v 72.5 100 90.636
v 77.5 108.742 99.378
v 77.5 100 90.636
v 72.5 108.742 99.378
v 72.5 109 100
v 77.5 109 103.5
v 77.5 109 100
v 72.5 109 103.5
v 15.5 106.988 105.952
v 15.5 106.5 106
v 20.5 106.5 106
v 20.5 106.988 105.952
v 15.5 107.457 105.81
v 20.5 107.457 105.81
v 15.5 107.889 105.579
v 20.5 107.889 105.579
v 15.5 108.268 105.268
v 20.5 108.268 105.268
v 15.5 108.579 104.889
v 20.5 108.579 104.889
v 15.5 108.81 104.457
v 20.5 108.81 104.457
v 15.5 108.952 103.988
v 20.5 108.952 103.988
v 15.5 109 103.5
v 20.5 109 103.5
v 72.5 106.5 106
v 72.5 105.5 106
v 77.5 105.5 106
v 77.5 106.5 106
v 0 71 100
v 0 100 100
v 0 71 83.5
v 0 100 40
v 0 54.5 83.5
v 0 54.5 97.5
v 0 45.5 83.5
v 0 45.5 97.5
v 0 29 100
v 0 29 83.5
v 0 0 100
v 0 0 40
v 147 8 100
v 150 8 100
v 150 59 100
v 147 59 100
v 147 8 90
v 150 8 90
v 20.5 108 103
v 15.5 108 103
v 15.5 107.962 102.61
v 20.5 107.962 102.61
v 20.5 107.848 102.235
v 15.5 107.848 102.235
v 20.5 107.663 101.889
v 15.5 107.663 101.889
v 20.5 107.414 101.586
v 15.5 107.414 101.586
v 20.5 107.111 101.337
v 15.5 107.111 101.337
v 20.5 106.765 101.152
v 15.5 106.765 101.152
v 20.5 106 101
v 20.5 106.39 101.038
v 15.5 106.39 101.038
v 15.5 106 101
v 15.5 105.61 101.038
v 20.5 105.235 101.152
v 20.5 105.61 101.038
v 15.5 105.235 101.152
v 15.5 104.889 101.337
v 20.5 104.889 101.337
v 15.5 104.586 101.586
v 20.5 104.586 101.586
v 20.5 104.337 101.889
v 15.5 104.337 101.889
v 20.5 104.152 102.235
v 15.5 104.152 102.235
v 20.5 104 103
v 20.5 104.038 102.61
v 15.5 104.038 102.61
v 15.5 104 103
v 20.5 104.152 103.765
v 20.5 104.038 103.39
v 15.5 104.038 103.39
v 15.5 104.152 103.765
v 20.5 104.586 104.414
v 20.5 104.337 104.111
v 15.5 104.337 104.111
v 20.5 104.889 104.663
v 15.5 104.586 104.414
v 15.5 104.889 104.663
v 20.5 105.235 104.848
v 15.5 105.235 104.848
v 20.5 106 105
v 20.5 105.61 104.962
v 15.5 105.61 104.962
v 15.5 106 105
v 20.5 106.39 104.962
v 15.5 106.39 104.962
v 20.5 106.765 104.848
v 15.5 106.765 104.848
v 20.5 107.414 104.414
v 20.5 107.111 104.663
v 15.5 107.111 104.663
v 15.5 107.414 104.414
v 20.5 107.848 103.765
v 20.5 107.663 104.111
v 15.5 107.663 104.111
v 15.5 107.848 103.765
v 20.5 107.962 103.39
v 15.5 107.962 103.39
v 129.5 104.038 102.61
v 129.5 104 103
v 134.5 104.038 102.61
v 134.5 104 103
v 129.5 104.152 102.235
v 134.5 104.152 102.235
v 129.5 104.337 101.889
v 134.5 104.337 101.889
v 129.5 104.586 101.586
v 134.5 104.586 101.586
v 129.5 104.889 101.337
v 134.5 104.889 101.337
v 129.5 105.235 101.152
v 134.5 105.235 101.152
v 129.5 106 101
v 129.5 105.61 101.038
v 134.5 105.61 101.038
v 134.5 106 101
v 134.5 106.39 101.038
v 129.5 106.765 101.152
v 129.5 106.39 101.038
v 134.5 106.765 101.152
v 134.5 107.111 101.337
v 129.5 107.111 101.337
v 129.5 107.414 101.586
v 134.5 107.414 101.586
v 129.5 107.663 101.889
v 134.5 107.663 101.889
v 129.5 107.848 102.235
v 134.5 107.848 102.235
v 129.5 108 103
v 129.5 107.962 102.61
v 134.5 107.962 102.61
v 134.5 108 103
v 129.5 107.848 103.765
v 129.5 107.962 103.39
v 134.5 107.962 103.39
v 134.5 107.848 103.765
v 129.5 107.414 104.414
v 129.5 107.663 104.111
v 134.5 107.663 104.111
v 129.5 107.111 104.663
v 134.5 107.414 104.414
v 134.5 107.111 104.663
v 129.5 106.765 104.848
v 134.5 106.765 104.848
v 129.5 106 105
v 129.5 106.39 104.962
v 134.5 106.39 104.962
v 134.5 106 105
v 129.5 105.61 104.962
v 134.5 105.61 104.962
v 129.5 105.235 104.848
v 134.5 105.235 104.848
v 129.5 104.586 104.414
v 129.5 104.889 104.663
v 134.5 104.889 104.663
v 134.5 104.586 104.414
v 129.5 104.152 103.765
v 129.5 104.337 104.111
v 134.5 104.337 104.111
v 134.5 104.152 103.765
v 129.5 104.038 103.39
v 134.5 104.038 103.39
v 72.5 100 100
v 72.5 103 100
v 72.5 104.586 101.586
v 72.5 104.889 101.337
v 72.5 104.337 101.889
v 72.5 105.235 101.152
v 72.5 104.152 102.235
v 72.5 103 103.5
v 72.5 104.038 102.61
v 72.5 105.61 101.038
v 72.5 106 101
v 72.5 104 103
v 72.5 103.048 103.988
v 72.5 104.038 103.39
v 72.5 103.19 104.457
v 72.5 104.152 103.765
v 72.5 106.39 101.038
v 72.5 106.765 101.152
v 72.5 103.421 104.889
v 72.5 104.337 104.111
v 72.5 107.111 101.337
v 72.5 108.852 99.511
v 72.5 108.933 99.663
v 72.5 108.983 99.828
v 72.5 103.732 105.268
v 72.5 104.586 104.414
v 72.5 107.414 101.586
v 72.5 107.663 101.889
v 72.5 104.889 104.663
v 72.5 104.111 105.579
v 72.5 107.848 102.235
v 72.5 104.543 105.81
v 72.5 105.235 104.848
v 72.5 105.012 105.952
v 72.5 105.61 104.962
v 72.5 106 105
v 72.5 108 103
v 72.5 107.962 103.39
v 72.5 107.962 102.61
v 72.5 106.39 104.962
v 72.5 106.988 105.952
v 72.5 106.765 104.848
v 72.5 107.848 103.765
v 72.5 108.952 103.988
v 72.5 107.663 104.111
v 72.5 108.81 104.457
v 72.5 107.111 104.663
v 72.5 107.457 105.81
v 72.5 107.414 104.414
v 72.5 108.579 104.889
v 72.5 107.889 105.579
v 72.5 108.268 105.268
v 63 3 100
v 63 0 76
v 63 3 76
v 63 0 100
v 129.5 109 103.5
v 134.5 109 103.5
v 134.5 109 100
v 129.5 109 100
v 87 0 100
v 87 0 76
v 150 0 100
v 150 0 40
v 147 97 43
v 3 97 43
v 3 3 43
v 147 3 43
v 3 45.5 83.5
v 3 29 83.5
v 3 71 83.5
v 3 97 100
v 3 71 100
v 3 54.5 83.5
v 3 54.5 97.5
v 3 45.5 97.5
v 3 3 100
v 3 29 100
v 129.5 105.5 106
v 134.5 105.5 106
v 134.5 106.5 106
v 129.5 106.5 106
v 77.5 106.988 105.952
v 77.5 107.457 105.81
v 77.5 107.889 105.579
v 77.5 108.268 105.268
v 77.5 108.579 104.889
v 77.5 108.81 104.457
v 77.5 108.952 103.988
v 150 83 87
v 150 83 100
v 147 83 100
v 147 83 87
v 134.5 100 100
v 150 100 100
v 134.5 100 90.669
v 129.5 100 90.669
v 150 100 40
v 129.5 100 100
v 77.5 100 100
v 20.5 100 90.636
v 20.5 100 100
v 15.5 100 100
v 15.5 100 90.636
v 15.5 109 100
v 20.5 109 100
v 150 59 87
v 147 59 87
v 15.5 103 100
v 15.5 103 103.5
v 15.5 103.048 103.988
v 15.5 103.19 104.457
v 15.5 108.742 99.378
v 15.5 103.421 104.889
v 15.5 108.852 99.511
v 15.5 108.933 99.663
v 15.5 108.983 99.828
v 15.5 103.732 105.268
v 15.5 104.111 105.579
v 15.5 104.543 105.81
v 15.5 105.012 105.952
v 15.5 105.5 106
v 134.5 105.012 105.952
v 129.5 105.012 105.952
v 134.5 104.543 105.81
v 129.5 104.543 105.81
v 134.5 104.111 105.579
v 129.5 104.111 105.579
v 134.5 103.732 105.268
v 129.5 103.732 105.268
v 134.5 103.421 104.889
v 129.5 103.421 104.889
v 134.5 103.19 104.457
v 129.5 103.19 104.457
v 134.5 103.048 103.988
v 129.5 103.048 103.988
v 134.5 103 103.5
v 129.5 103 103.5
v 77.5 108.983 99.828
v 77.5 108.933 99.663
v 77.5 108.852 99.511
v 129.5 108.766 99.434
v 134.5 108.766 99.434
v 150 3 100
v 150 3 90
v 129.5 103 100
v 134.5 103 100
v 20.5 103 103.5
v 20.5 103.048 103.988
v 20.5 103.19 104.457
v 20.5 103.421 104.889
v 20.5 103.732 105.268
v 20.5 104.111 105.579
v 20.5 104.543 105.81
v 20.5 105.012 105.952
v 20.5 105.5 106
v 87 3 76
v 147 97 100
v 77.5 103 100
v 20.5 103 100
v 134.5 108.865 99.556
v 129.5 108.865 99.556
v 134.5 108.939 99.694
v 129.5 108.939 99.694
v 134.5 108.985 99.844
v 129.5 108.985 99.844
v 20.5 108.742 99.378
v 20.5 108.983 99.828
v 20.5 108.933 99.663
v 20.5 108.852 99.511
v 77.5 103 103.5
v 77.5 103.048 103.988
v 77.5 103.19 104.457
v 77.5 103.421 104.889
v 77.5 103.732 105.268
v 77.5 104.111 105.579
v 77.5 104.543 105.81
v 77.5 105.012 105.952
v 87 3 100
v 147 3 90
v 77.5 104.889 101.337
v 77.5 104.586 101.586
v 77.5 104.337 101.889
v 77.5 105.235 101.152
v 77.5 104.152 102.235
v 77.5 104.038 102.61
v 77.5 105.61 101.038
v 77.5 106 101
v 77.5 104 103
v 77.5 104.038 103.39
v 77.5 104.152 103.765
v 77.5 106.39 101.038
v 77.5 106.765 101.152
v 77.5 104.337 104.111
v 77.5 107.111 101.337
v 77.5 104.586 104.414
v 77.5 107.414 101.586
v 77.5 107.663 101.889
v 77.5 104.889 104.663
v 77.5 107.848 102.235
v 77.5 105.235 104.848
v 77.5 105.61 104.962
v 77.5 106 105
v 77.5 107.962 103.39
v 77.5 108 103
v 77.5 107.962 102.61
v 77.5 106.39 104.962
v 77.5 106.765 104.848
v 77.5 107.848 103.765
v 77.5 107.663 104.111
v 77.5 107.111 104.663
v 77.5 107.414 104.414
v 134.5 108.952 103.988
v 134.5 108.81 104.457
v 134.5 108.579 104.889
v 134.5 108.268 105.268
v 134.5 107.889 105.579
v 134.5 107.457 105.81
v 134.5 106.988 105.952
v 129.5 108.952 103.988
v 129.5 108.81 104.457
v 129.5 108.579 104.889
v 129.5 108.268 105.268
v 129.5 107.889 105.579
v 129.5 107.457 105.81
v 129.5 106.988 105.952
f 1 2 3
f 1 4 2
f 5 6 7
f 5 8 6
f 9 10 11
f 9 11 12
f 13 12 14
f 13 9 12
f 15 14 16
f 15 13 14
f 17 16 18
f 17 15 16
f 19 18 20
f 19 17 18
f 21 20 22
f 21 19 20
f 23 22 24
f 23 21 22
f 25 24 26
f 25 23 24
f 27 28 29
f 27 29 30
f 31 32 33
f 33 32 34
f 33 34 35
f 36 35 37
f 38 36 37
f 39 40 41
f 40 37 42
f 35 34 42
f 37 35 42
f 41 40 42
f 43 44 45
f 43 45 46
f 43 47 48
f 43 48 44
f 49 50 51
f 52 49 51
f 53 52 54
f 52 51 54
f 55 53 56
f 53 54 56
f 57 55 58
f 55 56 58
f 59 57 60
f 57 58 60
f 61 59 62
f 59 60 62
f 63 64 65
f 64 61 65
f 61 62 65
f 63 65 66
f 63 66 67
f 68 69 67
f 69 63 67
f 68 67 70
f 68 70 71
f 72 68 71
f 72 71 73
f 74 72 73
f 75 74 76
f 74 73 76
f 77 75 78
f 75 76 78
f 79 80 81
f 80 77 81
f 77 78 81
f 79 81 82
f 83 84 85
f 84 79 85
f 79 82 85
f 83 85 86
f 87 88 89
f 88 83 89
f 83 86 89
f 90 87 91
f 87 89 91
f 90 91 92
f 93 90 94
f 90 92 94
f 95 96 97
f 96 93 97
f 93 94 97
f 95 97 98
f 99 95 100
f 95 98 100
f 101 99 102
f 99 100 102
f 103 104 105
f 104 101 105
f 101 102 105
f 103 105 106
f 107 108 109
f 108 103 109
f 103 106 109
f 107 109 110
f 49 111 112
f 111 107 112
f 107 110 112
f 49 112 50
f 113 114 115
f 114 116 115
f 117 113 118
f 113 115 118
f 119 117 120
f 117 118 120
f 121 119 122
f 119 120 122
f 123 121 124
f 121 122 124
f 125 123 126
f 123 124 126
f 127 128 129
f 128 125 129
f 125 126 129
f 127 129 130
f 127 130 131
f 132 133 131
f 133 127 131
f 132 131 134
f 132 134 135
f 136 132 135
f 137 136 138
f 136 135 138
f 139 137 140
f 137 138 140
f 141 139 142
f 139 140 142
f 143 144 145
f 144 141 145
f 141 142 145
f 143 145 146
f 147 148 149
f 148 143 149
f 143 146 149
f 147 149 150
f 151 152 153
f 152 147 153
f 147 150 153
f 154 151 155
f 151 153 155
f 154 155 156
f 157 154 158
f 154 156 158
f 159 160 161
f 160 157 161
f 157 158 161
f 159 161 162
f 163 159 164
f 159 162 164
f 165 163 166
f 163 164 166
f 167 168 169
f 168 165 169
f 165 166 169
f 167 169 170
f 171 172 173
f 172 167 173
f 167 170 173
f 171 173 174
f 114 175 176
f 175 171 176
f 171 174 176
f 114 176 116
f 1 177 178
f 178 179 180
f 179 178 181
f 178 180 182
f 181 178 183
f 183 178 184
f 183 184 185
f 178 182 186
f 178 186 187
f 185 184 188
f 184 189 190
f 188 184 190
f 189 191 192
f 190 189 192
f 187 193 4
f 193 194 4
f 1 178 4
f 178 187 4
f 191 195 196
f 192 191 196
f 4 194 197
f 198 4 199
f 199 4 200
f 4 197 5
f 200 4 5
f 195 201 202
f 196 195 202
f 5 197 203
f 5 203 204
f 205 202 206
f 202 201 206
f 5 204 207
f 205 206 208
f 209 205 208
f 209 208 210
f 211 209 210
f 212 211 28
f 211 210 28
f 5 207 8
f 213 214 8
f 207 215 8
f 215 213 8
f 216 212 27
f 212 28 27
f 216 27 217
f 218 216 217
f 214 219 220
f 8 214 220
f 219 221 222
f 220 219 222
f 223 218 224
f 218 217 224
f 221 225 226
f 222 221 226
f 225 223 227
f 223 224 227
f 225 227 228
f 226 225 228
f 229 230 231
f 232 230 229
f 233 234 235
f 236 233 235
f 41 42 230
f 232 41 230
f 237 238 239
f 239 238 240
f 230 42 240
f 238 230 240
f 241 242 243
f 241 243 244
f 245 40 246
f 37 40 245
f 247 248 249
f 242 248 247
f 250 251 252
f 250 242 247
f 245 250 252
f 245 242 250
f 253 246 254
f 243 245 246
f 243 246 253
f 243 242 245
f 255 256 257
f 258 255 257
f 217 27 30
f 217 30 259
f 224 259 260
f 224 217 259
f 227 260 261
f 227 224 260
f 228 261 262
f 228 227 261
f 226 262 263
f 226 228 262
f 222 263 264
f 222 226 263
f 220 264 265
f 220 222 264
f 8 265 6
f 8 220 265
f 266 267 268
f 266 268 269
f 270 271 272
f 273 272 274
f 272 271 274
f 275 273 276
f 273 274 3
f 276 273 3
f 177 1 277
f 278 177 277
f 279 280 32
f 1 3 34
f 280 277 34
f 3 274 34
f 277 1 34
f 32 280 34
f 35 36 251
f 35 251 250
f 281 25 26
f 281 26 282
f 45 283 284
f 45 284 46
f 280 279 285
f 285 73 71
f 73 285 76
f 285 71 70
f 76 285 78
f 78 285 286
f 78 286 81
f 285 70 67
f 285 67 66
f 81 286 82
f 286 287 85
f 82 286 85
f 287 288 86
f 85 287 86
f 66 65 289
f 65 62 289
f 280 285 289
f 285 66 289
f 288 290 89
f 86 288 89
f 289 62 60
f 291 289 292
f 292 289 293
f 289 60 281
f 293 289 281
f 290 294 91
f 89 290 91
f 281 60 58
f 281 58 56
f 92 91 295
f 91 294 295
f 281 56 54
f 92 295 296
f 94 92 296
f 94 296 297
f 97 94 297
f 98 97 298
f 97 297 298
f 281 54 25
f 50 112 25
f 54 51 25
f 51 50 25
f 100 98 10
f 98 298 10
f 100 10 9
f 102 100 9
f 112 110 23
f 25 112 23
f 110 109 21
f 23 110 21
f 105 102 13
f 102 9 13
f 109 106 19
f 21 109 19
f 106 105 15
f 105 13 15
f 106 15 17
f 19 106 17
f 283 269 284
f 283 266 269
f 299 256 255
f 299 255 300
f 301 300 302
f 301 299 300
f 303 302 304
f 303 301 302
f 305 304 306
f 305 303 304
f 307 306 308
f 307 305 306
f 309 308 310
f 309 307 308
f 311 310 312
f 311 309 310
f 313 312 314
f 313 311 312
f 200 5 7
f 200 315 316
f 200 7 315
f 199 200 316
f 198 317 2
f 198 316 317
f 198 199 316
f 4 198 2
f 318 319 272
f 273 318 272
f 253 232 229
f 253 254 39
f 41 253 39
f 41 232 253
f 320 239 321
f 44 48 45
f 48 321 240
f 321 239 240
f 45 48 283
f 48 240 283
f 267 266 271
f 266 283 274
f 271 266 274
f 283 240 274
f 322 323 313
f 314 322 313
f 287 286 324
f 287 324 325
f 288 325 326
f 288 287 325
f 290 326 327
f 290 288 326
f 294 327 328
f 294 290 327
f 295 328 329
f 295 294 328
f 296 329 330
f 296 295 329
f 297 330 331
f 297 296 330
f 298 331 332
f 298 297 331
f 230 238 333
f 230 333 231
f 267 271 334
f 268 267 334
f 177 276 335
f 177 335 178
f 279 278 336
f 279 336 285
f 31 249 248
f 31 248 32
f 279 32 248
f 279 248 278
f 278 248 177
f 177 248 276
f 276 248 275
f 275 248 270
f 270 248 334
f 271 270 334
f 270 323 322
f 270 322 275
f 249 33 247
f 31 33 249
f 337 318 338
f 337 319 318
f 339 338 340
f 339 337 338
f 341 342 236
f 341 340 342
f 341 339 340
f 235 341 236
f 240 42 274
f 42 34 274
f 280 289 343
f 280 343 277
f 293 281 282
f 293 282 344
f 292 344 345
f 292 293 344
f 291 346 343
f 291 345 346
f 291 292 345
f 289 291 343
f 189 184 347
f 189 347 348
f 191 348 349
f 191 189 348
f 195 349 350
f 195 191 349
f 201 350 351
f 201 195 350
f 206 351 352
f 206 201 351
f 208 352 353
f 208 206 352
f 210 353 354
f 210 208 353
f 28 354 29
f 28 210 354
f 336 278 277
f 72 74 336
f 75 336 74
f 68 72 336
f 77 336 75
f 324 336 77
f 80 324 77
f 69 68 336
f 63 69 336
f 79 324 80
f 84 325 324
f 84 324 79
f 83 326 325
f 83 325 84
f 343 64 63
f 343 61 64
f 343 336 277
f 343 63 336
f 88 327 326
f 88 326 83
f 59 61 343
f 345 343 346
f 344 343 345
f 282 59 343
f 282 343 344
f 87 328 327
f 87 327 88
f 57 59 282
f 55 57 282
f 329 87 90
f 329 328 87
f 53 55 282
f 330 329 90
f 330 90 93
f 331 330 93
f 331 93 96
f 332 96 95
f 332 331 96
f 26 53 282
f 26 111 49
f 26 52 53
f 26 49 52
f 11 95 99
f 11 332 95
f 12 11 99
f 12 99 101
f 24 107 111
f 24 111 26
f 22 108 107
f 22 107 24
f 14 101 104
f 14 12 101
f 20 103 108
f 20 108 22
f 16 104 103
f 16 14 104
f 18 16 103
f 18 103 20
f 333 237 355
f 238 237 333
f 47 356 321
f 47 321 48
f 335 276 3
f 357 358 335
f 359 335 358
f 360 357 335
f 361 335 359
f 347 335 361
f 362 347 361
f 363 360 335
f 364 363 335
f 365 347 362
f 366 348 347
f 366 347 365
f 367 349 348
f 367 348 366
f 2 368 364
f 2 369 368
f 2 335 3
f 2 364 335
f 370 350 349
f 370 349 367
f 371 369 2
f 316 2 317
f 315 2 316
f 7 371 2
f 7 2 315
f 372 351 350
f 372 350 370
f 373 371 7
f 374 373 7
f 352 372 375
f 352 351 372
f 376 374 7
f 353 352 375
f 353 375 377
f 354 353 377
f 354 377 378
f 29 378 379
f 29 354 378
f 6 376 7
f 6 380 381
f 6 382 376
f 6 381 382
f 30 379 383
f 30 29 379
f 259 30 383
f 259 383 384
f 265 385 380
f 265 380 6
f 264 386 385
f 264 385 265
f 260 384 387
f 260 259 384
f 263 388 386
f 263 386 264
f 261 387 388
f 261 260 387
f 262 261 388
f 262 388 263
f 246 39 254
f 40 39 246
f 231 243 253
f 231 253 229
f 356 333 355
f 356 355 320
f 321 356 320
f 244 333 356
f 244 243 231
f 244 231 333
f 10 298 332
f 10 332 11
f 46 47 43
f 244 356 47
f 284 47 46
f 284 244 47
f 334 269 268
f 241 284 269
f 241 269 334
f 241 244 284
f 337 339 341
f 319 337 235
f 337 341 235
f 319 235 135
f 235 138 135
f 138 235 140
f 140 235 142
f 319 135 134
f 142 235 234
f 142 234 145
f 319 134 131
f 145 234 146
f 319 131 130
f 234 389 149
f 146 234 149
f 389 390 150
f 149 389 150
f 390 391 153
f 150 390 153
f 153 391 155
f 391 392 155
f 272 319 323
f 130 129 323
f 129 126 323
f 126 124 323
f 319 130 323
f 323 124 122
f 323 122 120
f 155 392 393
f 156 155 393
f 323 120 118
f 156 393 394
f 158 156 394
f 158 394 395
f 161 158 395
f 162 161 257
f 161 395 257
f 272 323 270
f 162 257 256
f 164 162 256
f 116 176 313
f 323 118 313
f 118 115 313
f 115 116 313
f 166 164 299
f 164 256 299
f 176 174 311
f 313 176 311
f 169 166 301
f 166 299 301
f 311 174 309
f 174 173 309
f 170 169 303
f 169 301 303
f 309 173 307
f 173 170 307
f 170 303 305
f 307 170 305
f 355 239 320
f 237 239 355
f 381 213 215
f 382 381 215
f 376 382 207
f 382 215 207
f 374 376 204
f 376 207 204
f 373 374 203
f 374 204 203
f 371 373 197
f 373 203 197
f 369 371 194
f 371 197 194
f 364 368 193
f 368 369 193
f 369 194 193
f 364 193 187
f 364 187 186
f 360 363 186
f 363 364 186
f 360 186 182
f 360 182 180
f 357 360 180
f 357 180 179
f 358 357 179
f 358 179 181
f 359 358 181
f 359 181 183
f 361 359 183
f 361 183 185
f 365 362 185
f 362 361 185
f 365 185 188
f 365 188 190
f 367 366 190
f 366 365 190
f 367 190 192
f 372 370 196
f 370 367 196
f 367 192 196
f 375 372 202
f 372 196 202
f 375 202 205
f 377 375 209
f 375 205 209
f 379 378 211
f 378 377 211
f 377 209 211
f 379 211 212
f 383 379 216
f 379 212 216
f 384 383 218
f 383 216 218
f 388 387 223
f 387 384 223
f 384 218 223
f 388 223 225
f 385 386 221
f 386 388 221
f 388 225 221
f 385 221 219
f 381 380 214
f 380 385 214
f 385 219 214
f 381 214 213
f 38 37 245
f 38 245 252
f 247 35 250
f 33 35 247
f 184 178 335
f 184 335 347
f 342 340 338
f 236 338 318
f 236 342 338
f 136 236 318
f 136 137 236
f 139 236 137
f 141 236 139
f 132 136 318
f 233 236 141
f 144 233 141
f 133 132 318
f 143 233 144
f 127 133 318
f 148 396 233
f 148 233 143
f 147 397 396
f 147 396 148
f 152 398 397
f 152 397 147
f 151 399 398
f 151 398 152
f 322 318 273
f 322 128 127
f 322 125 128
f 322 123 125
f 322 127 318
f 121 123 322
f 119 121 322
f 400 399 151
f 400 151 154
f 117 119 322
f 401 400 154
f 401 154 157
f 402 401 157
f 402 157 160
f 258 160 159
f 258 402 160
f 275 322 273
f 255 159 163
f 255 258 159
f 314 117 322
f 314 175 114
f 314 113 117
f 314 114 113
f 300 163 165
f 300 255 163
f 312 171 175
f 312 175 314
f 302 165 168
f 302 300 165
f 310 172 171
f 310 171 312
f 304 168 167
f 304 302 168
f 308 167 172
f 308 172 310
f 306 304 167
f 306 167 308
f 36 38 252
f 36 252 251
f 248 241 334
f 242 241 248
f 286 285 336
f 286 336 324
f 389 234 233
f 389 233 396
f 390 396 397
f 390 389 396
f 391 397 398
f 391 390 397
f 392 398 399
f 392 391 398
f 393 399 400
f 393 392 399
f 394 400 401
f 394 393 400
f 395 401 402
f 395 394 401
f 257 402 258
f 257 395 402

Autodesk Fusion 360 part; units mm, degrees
sketch "草图1" plane through (75, 0, 0) normal (1, 0, 0) x (0, 1, 0)
  line L0 (100, 100) -> (103, 100)
  line L1 (103, 100) -> (103, 103.5)
  line L2 (105.5, 106) -> (106.5, 106)
  line L3 (109, 103.5) -> (109, 100)
  line L4 (108.7423, 99.3777) -> (100, 90.6355)
  circle A0 centre (106, 103) radius 2
  line L5 (100, 0) -> (100, 100)
  arc A1 (105.5, 106) -> (103, 103.5) centre (105.5, 103.5) ccw
  arc A2 (109, 103.5) -> (106.5, 106) centre (106.5, 103.5) ccw
  arc A3 (108.7423, 99.3777) -> (109, 100) centre (108.12, 100) ccw
  point P0 (100, 100)
  dimension "d1" = 3
  dimension "d2" = 4
  dimension "d3" = 3
  dimension "d6" = 3
  dimension "d9" = 3
  dimension "d10" = 3
  dimension "d13" = 135
  dimension "d14" = 2.5
  dimension "d15" = 2.5
  dimension "d16" = 0.88
sketch "草图2" plane through (18, 0, 0) normal (1, 0, 0) x (0, 1, 0)
  arc A0 (108.7423, 99.3777) -> (109, 100) centre (108.12, 100) ccw
  arc A1 (105.5, 106) -> (103, 103.5) centre (105.5, 103.5) ccw
  line L0 (105.5, 106) -> (106.5, 106)
  line L1 (100, 100) -> (103, 100)
  arc A2 (109, 103.5) -> (106.5, 106) centre (106.5, 103.5) ccw
  circle A3 centre (106, 103) radius 2
  line L2 (109, 103.5) -> (109, 100)
  line L3 (108.7423, 99.3777) -> (100, 90.6355)
  line L4 (103, 100) -> (103, 103.5)
  line L5 (100, 0) -> (100, 100)
  point P0 (100, 100)
  point P1 (100, 100)
  point P2 (100, 100)
  dimension "d17" = 3
  dimension "d18" = 4
  dimension "d21" = 3
  dimension "d22" = 3
  dimension "d23" = 3
  dimension "d26" = 3
  dimension "d27" = 135
  dimension "d30" = 2.5
  dimension "d31" = 2.5
  dimension "d32" = 0.88
sketch "草图3" plane through (147, 0, 0) normal (-1, 0, 0) x (0, -1, 0)
  line L0 (-59, 100) -> (-59, 87)
  line L1 (-59, 87) -> (-83, 87)
  line L2 (-83, 87) -> (-83, 100)
  line L3 (-83, 100) -> (-97, 100)
  line L4 (-97, 100) -> (-97, 3)
  line L5 (-97, 3) -> (-3, 3)
  line L6 (-3, 3) -> (-3, 100)
  line L7 (-3, 100) -> (-59, 100)
  line L8 (-8, 100) -> (-3, 100)
  line L9 (-3, 100) -> (-3, 90)
  line L10 (-3, 90) -> (-8, 90)
  line L11 (-8, 90) -> (-8, 100)
  dimension "d33" = 5
  dimension "d34" = 10
sketch "草图4" plane through (132, 0, 0) normal (-1, 0, 0) x (0, -1, 0)
  line L0 (-100, 100) -> (-103, 100)
  line L1 (-105.5, 106) -> (-106.5, 106)
  arc A0 (-106.5, 106) -> (-109, 103.5) centre (-106.5, 103.5) ccw
  line L2 (-103, 100) -> (-103, 103.5)
  arc A1 (-103, 103.5) -> (-105.5, 106) centre (-105.5, 103.5) ccw
  circle A2 centre (-106, 103) radius 2
  line L3 (-109, 103.5) -> (-109, 100)
  arc A3 (-109, 100) -> (-108.7657, 99.4343) centre (-108.2, 100) ccw
  line L4 (-108.7657, 99.4343) -> (-100, 90.6686)
  line L5 (-100, 0) -> (-100, 100)
  point P0 (-105.9337, 94.2405)
  point P1 (-105.9337, 94.2405)
  point P2 (-100, 100)
  dimension "d35" = 3.5
  dimension "d36" = 3
  dimension "d37" = 3
  dimension "d38" = 3
  dimension "d39" = 3
  dimension "d42" = 3
  dimension "d43" = 1
  dimension "d44" = 4
  dimension "d45" = 0.8
  dimension "d46" = 135
sketch "草图5" plane through (0, 0, 0) normal (0, -1, 0) x (1, 0, 0)
  line L0 (0, 0) -> (150, 0)
  line L1 (150, 0) -> (150, 100)
  line L2 (150, 100) -> (0, 100)
  line L3 (0, 100) -> (0, 0)
  line L4 (63, 100) -> (87, 100)
  line L5 (87, 100) -> (87, 76)
  line L6 (87, 76) -> (63, 76)
  line L7 (63, 76) -> (63, 100)
  dimension "d47" = 24
  dimension "d48" = 24
sketch "草图6" plane through (0, 0, 0) normal (-1, 0, 0) x (0, -1, 0)
  line L0 (-100, 0) -> (0, 0)
  line L1 (0, 0) -> (0, 100)
  line L2 (0, 100) -> (-100, 100)
  line L3 (-100, 100) -> (-100, 0)
  line L4 (-71, 100) -> (-54.5, 100)
  line L5 (-54.5, 100) -> (-54.5, 83.5)
  line L6 (-54.5, 83.5) -> (-71, 83.5)
  line L7 (-71, 83.5) -> (-71, 100)
  line L8 (-45.5, 100) -> (-29, 100)
  line L9 (-29, 100) -> (-29, 83.5)
  line L10 (-29, 83.5) -> (-45.5, 83.5)
  line L11 (-45.5, 83.5) -> (-45.5, 100)
  line L12 (-54.5, 100) -> (-45.5, 100) construction
  line L13 (-54.5, 100) -> (-45.5, 100)
  line L14 (-45.5, 100) -> (-45.5, 97.5)
  line L15 (-45.5, 97.5) -> (-54.5, 97.5)
  line L16 (-54.5, 97.5) -> (-54.5, 100)
  dimension "d49" = 16.5
  dimension "d50" = 16.5
  dimension "d51" = 16.5
  dimension "d52" = 16.5
  dimension "d53" = 9
  dimension "d56" = 14
sketch "草图7" plane through (0, 0, 3) normal (0, 0, 1) x (-1, 0, 0)
  line L0 (0, -100) -> (0, 0)
  line L1 (0, 0) -> (-150, 0)
  line L2 (-150, 0) -> (-150, -100)
  line L3 (-150, -100) -> (0, -100)
  line L4 (-3, -3) -> (-147, -3)
  line L5 (-147, -3) -> (-147, -97)
  line L6 (-147, -97) -> (-3, -97)
  line L7 (-3, -97) -> (-3, -3)
  dimension "d57" = -3
sketch "草图8" plane through (150, 0, 0) normal (1, 0, 0) x (0, 1, 0)
  line L0 (0, 0) -> (100, 0)
  line L1 (100, 0) -> (100, 100)
  line L2 (100, 100) -> (0, 100)
  line L3 (0, 100) -> (0, 0)
  line L4 (59, 100) -> (83, 100)
  line L5 (83, 100) -> (83, 87)
  line L6 (83, 87) -> (59, 87)
  line L7 (59, 87) -> (59, 100)
  dimension "d58" = 24
  dimension "d59" = 13
  dimension "d60" = 17
sketch "草图9" plane through (0, 0, 0) normal (0, 0, 1) x (1, 0, 0)
  line L0 (0, 0) -> (150, 0)
  line L1 (150, 0) -> (150, 100)
  line L2 (150, 100) -> (0, 100)
  line L3 (0, 100) -> (0, 0)
  dimension "d61" = 150
  dimension "d62" = 100
extrude "拉伸1" add sketch "草图9" along normal blind 3
extrude "拉伸2" add sketch "草图7" along normal blind 97
extrude "拉伸3" cut sketch "草图5" against normal blind 25 contours L2 L4 L5 L6 L7
extrude "拉伸4" cut sketch "草图6" against normal blind 10 contours L2 L4 L5 L6 L7 L16 | L2 L8 L9 L10 L11 L14 | L2 L5 L11 L13 L14 L15 L16
extrude "拉伸5" cut sketch "草图8" against normal blind 20 contours L2 L4 L5 L6 L7
extrude "拉伸6" cut sketch "草图3" against normal blind 10 contours L6 L7 L8 L9 L10 L11
extrude "拉伸7" add sketch "草图1" along normal mid plane 5
extrude "拉伸8" add sketch "草图2" along normal mid plane 5
extrude "拉伸9" add sketch "草图4" along normal mid plane 5
extrude "拉伸10" add 1 faces at (51, 65.6667, 3) along direction (0, 0, 1) blind 40
extrude "拉伸11" cut 1 faces at (50, 66.6667, 0) along direction (0, 0, 1) blind 40
equation "d7 = 100 mm - 3 mm"
